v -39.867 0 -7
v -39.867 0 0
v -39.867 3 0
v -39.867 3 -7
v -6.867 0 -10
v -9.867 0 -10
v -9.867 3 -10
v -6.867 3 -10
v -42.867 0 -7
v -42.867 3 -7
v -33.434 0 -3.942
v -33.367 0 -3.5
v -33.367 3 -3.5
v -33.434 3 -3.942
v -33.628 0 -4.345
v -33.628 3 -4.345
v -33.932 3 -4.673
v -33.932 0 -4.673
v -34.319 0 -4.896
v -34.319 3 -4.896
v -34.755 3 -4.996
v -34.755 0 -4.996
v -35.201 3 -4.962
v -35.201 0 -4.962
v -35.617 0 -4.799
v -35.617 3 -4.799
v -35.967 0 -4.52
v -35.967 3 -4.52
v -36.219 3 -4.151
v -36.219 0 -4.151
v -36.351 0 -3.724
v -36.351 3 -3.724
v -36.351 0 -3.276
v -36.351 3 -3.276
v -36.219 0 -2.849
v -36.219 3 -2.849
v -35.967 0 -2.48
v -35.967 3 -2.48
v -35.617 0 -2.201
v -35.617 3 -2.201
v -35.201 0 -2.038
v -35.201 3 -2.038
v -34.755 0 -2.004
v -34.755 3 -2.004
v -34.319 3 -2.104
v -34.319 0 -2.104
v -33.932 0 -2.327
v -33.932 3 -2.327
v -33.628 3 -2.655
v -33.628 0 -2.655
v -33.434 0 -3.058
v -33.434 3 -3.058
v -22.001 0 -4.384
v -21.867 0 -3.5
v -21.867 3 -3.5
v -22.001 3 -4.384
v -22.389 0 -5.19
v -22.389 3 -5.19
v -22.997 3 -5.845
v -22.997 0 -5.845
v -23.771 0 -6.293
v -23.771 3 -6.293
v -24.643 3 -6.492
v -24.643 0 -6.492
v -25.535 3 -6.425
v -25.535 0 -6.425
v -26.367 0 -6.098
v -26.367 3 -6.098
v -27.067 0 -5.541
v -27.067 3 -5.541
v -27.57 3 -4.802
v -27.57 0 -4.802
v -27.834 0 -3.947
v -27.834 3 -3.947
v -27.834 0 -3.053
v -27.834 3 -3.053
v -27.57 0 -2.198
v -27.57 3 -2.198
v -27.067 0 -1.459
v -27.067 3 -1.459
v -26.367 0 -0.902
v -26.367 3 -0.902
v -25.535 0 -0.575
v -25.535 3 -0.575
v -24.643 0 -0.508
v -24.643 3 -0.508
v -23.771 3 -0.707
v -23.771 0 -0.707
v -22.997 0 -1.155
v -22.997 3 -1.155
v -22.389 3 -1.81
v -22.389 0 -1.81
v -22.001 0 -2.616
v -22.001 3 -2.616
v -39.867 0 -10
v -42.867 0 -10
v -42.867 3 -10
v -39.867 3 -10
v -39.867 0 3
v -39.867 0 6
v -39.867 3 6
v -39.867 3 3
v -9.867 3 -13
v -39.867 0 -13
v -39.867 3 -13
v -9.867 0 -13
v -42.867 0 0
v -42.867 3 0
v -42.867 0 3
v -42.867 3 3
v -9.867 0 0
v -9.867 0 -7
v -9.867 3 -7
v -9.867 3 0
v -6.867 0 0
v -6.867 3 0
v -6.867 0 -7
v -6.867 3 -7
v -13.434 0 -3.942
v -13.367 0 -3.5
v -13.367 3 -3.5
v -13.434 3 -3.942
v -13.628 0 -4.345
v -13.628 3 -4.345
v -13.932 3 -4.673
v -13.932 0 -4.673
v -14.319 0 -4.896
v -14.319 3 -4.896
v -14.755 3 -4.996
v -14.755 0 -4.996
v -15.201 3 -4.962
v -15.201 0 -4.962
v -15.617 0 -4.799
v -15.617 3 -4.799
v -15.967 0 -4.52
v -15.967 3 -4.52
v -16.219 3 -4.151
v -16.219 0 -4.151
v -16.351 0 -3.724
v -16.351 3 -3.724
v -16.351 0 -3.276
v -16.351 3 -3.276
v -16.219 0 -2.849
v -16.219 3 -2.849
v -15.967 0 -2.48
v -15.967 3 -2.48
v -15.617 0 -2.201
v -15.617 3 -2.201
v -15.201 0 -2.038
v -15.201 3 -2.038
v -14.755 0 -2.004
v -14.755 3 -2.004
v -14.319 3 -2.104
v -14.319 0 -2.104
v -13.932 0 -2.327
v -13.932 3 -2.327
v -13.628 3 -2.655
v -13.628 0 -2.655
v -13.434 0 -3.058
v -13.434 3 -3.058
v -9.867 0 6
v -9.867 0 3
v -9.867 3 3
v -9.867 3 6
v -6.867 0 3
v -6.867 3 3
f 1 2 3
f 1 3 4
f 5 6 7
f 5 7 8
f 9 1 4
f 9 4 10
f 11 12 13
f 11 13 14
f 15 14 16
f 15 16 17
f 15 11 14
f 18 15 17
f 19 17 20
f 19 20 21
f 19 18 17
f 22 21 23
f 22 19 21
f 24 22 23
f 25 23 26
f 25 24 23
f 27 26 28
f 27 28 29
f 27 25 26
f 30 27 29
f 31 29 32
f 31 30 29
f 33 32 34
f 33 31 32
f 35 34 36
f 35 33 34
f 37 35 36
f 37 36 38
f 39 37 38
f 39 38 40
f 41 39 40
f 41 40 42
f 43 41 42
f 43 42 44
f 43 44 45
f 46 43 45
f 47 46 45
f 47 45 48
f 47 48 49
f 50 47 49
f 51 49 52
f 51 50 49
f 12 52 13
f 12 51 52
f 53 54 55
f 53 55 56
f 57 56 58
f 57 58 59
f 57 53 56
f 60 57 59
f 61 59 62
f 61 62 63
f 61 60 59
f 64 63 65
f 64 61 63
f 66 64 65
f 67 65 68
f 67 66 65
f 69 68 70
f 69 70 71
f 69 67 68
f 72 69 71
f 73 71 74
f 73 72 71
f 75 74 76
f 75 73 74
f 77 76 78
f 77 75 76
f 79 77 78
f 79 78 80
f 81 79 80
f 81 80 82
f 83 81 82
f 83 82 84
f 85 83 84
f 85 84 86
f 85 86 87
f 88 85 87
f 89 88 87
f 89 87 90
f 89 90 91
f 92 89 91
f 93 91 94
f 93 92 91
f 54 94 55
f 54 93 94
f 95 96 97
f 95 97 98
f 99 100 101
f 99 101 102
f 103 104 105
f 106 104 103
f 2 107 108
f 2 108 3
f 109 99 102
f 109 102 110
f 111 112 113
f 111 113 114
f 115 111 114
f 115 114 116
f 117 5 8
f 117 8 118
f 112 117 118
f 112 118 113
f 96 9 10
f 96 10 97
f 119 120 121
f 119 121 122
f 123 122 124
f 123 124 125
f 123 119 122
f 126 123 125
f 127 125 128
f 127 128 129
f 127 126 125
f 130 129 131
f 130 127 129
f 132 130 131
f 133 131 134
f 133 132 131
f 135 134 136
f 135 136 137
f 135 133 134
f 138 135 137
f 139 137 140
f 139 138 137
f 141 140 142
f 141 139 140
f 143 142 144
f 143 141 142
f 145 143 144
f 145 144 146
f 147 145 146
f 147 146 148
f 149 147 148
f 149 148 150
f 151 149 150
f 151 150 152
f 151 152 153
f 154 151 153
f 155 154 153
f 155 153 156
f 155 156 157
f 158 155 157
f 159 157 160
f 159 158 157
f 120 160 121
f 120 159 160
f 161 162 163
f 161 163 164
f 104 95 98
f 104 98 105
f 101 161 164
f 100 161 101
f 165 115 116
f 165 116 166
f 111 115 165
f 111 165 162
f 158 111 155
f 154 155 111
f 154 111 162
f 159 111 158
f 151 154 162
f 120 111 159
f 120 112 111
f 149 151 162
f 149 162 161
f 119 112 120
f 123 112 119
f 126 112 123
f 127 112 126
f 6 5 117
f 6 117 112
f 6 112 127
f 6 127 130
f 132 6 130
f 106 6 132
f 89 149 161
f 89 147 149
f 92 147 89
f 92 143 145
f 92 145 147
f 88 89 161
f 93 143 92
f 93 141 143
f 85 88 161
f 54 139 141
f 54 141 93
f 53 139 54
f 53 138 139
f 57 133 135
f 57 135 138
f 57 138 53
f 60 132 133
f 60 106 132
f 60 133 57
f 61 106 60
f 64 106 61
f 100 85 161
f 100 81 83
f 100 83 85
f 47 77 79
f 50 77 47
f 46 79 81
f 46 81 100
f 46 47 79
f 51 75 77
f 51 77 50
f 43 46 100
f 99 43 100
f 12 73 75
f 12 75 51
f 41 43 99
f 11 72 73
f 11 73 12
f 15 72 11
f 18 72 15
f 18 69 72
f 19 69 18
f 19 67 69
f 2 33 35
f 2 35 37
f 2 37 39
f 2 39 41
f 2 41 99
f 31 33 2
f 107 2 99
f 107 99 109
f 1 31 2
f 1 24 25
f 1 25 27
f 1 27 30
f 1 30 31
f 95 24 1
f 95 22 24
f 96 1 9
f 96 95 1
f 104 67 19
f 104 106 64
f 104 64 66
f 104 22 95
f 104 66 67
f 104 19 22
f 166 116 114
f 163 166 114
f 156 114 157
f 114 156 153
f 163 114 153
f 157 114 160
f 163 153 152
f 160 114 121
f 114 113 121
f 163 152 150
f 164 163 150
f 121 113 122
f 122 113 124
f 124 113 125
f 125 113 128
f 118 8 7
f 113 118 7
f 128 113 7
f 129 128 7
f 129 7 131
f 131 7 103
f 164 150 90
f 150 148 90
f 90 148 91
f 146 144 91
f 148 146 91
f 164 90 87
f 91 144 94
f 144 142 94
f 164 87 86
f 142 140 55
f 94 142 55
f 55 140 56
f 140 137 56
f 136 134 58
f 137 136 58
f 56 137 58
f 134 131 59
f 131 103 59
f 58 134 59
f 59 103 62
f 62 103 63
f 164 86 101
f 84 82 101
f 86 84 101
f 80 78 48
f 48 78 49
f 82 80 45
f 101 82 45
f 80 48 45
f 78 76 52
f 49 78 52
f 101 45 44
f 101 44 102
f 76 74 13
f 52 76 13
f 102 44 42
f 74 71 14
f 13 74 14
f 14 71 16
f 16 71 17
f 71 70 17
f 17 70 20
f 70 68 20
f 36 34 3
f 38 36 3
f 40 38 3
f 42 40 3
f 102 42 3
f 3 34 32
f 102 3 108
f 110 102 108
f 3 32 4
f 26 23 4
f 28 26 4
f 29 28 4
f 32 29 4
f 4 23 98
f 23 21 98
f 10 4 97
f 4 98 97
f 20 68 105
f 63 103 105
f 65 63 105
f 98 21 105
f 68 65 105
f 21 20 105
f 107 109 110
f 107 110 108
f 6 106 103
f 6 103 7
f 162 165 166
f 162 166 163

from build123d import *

# Parameters (mm, degrees)
SKETCH1_R           = 3
SKETCH1_R_2         = 1.5
BOSS_EXTRUDE1_DEPTH = 3


with BuildPart() as part:
    # Sketch1 → Boss-Extrude1 (new body)
    with BuildSketch(Plane(origin=(0, 0, 0), x_dir=(1, 0, 0), z_dir=(0, 1, 0))):
        Polygon((-42.867412192, 7), (-42.867412192, 10), (-39.867412192, 10), (-39.867412192, 13), (-9.867412192, 13), (-9.867412192, 10), (-6.867412192, 10), (-6.867412192, 7), (-9.867412192, 7), (-9.867412192, 0), (-6.867412192, 0), (-6.867412192, -3), (-9.867412192, -3), (-9.867412192, -6), (-39.867412192, -6), (-39.867412192, -3), (-42.867412192, -3), (-42.867412192, 0), (-39.867412192, 0), (-39.867412192, 7), align=None)
        with Locations((-24.867412192, 3.5)):
            Circle(SKETCH1_R, mode=Mode.SUBTRACT)
        with Locations((-34.867412192, 3.5)):
            Circle(SKETCH1_R_2, mode=Mode.SUBTRACT)
        with Locations((-14.867412192, 3.5)):
            Circle(SKETCH1_R_2, mode=Mode.SUBTRACT)
    extrude(amount=BOSS_EXTRUDE1_DEPTH)


solid = part.part
